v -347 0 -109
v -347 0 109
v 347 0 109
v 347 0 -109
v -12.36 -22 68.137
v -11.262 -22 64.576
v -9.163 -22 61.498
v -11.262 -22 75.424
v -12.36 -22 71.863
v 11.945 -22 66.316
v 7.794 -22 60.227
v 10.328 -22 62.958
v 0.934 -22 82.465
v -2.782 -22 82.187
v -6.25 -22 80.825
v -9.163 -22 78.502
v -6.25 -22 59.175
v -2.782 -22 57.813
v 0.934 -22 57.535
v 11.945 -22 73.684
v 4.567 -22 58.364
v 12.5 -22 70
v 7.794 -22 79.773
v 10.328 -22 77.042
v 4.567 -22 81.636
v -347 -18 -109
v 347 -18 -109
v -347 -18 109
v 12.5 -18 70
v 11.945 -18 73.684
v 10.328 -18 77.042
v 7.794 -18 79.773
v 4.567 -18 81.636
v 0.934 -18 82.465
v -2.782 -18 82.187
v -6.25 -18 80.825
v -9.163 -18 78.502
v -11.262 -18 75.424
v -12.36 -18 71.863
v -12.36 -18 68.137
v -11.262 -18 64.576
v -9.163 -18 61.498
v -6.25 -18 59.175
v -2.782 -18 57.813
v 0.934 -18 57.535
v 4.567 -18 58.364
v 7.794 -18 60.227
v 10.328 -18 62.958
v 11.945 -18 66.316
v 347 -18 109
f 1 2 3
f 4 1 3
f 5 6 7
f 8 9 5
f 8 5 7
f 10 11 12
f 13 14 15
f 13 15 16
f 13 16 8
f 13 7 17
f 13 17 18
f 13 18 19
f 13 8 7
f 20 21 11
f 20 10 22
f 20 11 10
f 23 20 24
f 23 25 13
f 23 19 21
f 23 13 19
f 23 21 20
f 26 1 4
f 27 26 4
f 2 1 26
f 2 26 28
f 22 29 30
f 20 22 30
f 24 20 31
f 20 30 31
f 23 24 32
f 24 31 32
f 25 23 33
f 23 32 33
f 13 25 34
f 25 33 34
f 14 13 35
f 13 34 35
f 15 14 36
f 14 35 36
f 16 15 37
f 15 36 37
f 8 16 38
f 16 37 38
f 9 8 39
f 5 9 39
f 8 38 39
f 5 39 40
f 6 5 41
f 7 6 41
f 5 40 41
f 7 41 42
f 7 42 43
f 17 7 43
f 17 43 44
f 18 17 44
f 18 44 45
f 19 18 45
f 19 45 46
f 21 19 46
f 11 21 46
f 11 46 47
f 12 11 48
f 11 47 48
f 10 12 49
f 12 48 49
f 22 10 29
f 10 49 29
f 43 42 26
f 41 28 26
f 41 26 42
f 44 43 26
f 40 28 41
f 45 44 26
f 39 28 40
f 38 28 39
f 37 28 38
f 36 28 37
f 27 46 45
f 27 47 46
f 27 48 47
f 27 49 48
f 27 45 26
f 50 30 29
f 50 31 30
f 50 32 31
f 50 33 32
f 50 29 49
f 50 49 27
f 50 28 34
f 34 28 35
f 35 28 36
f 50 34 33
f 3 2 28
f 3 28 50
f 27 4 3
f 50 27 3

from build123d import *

# Parameters (mm, degrees)
F0_W     = 694
F0_H     = 218
F1_DEPTH = 18
F2_R     = 12.5
F3_DEPTH = 4


with BuildPart() as f1:
    # F0 (on Front) → F1 (new body)
    with BuildSketch(Plane.XZ):
        Rectangle(F0_W, F0_H)
    extrude(amount=F1_DEPTH)

    # F2 (on face) → F3 (join)
    with BuildSketch(Plane.XZ.offset(18)):
        with Locations((0, 70)):
            Circle(F2_R)
    extrude(amount=F3_DEPTH)


solid = f1.part
